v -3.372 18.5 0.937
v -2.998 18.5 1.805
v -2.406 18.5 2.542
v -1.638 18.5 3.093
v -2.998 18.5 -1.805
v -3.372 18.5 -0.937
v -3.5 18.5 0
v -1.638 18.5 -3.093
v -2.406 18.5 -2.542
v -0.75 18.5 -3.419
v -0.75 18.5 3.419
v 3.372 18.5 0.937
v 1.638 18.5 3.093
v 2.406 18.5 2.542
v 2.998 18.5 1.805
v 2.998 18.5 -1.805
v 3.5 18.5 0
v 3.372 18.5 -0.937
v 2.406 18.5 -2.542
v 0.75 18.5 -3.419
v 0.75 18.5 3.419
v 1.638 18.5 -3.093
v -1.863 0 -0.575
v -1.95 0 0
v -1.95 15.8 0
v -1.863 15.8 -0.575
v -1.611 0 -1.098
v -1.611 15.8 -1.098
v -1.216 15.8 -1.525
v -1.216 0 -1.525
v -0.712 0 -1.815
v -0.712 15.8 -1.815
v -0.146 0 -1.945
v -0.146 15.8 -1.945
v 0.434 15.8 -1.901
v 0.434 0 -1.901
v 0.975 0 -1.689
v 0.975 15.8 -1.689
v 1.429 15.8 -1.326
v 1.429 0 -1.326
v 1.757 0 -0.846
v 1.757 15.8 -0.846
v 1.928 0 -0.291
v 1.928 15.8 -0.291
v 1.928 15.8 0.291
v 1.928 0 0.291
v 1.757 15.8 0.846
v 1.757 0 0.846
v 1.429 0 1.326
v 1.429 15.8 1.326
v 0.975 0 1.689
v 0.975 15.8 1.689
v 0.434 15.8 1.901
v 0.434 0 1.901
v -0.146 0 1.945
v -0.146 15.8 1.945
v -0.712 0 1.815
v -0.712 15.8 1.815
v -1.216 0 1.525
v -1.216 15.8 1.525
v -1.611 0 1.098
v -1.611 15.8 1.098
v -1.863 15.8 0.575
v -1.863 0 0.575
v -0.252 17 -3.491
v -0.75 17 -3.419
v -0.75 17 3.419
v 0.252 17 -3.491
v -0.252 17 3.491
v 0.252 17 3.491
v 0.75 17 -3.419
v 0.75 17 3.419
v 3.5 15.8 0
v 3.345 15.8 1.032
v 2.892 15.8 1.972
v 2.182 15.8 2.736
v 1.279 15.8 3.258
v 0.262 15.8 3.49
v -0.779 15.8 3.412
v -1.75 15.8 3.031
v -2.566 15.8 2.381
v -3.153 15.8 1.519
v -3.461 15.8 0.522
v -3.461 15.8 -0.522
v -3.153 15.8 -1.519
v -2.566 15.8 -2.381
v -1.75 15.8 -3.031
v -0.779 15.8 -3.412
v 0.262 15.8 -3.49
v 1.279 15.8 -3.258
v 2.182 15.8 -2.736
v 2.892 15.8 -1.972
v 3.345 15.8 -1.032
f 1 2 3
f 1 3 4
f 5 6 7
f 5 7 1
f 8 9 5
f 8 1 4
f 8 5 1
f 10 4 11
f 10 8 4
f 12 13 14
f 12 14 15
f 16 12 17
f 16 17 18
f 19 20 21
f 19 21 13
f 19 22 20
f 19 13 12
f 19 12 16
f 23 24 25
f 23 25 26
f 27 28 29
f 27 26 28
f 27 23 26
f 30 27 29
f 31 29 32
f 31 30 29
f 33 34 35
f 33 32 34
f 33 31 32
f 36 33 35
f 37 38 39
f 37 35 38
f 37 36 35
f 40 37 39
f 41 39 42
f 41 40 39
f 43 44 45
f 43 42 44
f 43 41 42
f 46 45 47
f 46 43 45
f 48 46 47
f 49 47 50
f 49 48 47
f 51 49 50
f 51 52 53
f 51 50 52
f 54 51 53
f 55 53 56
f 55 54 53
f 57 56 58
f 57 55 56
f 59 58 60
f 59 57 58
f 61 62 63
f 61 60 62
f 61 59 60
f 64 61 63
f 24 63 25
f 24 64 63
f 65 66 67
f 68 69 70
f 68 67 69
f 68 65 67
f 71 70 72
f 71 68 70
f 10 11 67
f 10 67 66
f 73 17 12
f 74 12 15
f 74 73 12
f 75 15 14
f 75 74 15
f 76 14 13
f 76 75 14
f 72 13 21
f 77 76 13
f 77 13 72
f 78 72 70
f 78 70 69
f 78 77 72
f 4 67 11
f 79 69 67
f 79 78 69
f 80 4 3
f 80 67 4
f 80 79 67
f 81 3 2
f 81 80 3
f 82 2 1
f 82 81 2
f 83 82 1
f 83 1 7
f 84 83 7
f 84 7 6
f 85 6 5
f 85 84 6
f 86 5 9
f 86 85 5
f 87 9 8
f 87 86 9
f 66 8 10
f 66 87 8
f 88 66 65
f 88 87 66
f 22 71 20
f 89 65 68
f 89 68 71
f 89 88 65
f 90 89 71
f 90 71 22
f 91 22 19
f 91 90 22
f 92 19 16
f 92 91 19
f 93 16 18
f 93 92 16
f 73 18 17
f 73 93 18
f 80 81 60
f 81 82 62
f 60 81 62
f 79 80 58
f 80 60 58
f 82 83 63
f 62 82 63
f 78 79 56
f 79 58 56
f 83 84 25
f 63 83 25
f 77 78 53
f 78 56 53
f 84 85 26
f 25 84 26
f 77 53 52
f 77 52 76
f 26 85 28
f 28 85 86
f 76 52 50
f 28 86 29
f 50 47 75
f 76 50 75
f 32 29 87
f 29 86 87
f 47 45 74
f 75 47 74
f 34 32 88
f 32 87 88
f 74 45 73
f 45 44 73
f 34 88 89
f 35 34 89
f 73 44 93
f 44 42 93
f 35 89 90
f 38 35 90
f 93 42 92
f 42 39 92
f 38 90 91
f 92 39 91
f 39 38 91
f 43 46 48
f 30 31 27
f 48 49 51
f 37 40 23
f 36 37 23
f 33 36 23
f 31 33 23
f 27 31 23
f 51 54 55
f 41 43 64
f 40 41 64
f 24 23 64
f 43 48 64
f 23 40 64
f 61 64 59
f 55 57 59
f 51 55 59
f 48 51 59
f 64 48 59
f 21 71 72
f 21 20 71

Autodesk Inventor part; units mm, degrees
ref_plane "YZ Plane" through (0, 0, 0) normal (1, 0, 0) x (0, 1, 0)
ref_plane "XZ Plane" through (0, 0, 0) normal (0, 1, 0) x (-1, 0, 0)
ref_plane "XY Plane" through (0, 0, 0) normal (0, 0, 1) x (1, 0, 0)
sketch "Sketch1" plane through (0, 0, 0) normal (0, 1, 0) x (-1, 0, 0)
  circle A0 centre (0, 0) radius 1.95
  dimension "d0" = 3.9
extrude "Extrusion1" add sketch "Sketch1" along normal blind 15.8
sketch "Sketch2" plane through (0, 15.8, 0) normal (0, 1, 0) x (1, 0, 0)
  circle A0 centre (0, 0) radius 3.5
  dimension "d3" = 7
extrude "Extrusion2" add sketch "Sketch2" along normal blind 2.7
sketch "Sketch3" plane through (0, 18.5, 0) normal (0, 1, 0) x (1, 0, 0)
  line L0 (0.75, -8) -> (-0.75, -8)
  line L1 (-0.75, -8) -> (-0.75, 8)
  line L2 (-0.75, 8) -> (0.75, 8)
  line L3 (0.75, 8) -> (0.75, -8)
  line L4 (0.75, -8) -> (-0.75, 8) construction
  line L5 (-0.75, -8) -> (0.75, 8) construction
  point P0 (0, 0)
  dimension "d6" = 1.5
  dimension "d7" = 16
extrude "Extrusion3" cut sketch "Sketch3" against normal blind 1.5
properties part number "screw18.5mm" material "Stainless Steel"
